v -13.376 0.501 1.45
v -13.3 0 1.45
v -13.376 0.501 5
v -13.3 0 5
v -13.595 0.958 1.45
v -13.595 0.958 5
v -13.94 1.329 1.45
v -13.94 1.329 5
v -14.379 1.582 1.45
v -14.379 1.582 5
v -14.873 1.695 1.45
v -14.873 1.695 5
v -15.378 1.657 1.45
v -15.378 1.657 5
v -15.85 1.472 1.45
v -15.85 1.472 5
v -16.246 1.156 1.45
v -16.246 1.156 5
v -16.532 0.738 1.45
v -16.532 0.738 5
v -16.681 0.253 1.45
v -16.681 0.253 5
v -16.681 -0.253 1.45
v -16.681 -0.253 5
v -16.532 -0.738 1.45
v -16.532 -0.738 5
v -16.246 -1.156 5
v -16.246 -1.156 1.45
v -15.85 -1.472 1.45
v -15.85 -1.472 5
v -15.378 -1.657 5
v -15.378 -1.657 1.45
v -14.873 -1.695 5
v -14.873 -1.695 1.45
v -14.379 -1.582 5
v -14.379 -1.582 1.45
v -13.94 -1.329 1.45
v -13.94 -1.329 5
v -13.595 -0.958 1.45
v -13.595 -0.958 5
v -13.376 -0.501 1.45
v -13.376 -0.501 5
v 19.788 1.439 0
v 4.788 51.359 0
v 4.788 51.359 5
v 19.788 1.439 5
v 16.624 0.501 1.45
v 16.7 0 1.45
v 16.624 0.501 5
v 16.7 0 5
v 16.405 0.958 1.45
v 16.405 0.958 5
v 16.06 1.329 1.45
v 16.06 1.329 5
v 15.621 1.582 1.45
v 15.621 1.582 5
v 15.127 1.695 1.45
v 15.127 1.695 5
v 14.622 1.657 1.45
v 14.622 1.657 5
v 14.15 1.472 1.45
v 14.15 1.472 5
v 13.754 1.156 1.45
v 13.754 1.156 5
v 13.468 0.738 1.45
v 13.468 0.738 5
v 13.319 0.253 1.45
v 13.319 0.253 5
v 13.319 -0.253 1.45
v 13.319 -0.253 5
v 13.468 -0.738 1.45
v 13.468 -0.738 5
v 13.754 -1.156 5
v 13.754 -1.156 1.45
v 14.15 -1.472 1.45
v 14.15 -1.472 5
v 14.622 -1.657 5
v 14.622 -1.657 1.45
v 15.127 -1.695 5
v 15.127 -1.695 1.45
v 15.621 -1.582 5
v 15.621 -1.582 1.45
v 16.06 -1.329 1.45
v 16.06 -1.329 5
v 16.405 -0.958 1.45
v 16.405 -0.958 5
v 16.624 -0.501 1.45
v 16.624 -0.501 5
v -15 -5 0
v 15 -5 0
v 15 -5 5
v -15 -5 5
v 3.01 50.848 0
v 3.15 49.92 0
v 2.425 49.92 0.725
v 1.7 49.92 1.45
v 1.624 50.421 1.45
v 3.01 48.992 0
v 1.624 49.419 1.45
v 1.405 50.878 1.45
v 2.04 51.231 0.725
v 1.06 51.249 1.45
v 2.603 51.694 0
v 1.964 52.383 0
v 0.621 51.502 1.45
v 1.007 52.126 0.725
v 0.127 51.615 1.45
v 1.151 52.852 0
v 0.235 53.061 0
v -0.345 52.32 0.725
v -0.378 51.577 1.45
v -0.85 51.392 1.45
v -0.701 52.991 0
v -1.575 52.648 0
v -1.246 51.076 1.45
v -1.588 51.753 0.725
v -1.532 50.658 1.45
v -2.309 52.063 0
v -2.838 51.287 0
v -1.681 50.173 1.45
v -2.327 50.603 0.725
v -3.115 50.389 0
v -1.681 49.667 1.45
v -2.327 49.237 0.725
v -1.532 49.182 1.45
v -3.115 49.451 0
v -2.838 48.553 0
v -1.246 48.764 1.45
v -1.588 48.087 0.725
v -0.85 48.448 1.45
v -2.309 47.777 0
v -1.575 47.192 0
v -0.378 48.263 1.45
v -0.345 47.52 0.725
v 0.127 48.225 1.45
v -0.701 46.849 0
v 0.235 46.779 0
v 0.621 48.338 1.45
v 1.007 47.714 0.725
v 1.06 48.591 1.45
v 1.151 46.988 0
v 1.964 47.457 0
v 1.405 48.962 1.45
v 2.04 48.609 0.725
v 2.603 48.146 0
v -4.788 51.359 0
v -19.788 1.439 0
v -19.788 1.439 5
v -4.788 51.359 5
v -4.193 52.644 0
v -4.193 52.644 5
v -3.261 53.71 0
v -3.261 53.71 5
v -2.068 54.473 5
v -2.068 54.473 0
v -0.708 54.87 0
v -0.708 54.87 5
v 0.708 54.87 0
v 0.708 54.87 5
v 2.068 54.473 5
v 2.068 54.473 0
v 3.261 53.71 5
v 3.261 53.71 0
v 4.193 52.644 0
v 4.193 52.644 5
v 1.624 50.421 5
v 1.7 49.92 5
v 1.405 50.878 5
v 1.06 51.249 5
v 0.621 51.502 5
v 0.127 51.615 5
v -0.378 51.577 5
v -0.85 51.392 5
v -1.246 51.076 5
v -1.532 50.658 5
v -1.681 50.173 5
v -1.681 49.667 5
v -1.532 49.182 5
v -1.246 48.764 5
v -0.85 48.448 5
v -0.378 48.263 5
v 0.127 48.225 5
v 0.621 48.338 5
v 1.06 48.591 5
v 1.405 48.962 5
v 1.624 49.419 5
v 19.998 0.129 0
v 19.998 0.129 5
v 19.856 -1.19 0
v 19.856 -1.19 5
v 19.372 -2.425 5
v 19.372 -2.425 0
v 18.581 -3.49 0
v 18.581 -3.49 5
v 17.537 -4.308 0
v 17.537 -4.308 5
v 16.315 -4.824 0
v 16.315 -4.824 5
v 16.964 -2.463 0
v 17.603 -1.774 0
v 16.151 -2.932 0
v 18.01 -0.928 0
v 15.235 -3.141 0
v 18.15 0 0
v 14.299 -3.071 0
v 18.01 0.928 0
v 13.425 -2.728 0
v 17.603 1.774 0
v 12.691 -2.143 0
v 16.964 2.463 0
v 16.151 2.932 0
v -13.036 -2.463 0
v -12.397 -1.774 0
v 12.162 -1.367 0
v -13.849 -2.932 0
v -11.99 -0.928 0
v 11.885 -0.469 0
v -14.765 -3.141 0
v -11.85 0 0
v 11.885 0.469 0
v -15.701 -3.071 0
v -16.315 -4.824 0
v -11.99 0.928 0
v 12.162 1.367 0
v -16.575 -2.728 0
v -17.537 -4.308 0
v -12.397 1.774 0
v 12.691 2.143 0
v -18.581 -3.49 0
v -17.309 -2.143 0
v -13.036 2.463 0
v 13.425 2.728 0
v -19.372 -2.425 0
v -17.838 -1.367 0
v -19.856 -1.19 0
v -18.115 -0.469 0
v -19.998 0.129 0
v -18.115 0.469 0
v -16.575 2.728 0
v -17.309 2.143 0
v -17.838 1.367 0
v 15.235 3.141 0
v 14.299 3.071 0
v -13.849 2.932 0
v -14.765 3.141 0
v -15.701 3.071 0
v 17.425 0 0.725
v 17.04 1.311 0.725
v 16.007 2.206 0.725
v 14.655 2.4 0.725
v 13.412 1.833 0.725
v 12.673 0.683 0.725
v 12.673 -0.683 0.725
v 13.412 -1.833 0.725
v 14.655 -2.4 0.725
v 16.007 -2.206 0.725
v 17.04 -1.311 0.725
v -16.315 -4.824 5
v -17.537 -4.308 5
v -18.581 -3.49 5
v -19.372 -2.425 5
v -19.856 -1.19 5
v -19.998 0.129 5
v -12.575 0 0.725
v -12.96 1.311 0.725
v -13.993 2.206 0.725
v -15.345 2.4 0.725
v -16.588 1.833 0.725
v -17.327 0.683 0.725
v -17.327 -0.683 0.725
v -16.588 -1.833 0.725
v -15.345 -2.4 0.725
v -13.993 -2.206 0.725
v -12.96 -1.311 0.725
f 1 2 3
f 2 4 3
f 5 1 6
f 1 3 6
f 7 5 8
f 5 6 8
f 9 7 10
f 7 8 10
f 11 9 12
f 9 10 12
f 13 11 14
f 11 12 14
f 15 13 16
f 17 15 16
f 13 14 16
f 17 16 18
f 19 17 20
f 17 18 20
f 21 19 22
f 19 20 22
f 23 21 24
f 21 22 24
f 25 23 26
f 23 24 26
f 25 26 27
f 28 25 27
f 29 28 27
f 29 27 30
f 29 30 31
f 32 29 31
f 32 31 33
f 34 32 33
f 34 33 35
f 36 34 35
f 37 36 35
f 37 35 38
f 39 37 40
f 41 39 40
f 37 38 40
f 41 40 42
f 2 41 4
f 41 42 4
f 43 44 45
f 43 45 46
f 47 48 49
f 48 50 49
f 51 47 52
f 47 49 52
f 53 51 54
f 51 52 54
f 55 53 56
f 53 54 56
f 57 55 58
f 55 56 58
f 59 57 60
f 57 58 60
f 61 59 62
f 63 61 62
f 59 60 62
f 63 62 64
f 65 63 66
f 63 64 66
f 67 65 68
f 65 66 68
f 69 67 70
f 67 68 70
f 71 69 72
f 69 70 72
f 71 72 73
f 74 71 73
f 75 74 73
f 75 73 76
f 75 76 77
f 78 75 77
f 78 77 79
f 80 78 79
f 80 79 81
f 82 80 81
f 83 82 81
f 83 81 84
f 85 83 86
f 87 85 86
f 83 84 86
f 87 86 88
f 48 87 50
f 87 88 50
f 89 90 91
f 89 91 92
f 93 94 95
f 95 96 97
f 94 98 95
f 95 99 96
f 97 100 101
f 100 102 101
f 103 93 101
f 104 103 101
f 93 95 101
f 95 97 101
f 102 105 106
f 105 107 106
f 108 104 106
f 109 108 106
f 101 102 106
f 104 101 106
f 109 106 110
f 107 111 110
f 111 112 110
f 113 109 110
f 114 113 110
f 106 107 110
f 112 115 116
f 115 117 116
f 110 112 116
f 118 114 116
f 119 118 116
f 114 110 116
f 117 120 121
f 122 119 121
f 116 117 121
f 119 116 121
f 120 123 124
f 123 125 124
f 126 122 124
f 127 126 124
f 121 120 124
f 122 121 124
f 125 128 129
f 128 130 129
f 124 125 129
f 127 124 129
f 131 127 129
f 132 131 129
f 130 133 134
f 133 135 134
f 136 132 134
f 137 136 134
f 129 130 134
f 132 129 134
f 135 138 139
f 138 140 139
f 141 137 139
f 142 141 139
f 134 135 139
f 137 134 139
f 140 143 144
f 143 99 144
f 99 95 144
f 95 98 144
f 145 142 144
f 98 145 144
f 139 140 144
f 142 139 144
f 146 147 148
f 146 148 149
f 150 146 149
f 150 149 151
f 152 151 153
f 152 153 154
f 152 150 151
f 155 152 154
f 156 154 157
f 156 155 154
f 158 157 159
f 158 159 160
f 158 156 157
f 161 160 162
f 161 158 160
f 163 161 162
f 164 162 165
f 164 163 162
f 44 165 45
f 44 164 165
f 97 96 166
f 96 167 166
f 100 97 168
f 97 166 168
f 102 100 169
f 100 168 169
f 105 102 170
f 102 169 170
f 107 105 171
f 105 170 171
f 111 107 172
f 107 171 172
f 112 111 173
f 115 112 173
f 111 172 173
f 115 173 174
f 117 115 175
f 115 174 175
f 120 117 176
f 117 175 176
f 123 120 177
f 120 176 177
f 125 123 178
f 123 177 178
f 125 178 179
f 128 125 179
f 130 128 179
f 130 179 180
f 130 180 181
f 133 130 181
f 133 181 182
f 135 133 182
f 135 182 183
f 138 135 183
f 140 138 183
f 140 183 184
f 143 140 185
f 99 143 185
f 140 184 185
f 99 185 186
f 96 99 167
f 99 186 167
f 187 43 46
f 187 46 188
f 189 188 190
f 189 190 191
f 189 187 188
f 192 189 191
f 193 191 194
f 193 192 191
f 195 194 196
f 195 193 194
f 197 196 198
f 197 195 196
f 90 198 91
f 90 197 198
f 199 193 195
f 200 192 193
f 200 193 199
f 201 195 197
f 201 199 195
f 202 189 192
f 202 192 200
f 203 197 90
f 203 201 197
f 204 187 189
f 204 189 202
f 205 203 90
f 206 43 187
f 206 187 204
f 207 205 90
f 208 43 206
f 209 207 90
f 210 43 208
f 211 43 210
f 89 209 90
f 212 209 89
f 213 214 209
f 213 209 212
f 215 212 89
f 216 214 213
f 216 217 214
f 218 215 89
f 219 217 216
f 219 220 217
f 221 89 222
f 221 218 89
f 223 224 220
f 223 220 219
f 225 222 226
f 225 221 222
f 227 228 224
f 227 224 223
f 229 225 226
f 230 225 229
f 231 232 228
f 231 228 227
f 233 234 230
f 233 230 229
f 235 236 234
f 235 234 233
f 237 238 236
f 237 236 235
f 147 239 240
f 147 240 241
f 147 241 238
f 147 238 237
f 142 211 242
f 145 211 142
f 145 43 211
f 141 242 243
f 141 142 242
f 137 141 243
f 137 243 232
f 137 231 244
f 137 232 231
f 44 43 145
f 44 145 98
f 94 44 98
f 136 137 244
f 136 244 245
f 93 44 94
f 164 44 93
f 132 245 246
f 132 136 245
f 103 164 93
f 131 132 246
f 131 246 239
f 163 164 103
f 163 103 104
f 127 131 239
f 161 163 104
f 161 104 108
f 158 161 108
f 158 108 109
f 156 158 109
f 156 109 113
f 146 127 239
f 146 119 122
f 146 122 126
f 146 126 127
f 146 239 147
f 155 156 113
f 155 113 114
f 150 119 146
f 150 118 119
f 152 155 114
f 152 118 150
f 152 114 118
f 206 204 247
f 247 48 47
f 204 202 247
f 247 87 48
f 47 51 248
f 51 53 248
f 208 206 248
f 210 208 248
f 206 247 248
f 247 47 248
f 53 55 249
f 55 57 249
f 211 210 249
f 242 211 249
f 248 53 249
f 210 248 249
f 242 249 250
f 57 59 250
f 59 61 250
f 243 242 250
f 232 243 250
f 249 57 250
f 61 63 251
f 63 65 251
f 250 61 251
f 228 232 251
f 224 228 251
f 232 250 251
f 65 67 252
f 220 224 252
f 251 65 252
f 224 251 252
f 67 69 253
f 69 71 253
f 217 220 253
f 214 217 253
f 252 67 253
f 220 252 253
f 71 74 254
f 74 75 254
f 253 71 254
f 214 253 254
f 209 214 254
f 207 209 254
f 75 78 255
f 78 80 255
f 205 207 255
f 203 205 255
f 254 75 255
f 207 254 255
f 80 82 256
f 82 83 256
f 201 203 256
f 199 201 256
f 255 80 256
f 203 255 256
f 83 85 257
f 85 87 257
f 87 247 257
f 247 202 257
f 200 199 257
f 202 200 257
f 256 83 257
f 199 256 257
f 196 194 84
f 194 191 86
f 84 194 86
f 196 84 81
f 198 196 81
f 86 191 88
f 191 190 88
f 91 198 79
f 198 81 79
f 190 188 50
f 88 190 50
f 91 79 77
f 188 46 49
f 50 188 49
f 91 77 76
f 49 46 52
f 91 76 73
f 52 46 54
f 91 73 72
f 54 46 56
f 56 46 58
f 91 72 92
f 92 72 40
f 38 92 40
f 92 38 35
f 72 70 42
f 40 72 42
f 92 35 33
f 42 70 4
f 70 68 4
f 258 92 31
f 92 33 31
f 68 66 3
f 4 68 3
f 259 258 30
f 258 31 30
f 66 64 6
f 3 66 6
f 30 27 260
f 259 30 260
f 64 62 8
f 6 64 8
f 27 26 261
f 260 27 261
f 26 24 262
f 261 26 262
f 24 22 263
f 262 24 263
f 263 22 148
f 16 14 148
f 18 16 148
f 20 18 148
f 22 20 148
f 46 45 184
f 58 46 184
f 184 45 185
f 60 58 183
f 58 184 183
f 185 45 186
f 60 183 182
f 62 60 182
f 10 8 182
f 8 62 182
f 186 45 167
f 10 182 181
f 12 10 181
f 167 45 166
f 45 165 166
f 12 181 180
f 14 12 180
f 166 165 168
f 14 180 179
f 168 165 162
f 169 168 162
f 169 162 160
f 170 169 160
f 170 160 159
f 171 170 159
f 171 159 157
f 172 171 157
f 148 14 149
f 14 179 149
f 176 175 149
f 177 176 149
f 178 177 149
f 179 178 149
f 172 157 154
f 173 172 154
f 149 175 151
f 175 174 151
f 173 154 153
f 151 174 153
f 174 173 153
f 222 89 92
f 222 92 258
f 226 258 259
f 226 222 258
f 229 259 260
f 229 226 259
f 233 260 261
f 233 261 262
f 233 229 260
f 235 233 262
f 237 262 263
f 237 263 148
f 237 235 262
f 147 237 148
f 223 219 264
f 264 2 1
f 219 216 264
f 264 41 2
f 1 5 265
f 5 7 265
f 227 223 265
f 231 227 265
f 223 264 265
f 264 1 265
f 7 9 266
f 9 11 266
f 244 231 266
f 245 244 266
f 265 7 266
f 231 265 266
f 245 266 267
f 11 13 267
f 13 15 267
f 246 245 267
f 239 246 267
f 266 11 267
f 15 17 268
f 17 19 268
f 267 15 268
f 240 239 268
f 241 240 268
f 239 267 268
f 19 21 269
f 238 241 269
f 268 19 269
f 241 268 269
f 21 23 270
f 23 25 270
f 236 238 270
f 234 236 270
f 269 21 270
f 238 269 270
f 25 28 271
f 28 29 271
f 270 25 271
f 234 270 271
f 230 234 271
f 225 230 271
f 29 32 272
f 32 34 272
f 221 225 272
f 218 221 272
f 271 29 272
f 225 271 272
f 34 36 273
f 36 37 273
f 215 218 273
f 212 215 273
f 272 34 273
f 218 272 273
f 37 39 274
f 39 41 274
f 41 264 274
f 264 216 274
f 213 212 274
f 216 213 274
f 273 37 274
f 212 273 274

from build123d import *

# Parameters (mm, degrees)
BOSS_EXTRUDE1_DEPTH                             = 5
CSK_FOR_M3_FLAT_HEAD_MACHINE_SCREW2_D           = 3.4
CSK_FOR_M3_FLAT_HEAD_MACHINE_SCREW2_CSINK_D     = 6.3
CSK_FOR_M3_FLAT_HEAD_MACHINE_SCREW2_CSINK_ANGLE = 90


with BuildPart() as part:
    # Sketch1 → Boss-Extrude1 (new body)
    with BuildSketch(Plane.XY):
        with BuildLine():
            Line((4.788497338, 51.358851364), (19.788497338, 1.438851364))
            ThreePointArc((19.788497338, 1.438851364), (19.012122681, -2.983768019), (15, -5))
            Line((15, -5), (-15, -5))
            ThreePointArc((-15, -5), (-19.012122681, -2.983768019), (-19.788497338, 1.438851364))
            Line((-19.788497338, 1.438851364), (-4.788497338, 51.358851364))
            ThreePointArc((-4.788497338, 51.358851364), (0, 54.92), (4.788497338, 51.358851364))
        make_face()
    extrude(amount=BOSS_EXTRUDE1_DEPTH)

    # CSK for M3 Flat Head Machine Screw2 (through all)
    with Locations(Plane(origin=(-15, 0, 0), x_dir=(-1, 0, 0), z_dir=(0, 0, -1))):
        with Locations((0, 0), (-15, 49.92), (-30, 0)):
            CounterSinkHole(CSK_FOR_M3_FLAT_HEAD_MACHINE_SCREW2_D / 2, CSK_FOR_M3_FLAT_HEAD_MACHINE_SCREW2_CSINK_D / 2, counter_sink_angle=CSK_FOR_M3_FLAT_HEAD_MACHINE_SCREW2_CSINK_ANGLE)


solid = part.part
